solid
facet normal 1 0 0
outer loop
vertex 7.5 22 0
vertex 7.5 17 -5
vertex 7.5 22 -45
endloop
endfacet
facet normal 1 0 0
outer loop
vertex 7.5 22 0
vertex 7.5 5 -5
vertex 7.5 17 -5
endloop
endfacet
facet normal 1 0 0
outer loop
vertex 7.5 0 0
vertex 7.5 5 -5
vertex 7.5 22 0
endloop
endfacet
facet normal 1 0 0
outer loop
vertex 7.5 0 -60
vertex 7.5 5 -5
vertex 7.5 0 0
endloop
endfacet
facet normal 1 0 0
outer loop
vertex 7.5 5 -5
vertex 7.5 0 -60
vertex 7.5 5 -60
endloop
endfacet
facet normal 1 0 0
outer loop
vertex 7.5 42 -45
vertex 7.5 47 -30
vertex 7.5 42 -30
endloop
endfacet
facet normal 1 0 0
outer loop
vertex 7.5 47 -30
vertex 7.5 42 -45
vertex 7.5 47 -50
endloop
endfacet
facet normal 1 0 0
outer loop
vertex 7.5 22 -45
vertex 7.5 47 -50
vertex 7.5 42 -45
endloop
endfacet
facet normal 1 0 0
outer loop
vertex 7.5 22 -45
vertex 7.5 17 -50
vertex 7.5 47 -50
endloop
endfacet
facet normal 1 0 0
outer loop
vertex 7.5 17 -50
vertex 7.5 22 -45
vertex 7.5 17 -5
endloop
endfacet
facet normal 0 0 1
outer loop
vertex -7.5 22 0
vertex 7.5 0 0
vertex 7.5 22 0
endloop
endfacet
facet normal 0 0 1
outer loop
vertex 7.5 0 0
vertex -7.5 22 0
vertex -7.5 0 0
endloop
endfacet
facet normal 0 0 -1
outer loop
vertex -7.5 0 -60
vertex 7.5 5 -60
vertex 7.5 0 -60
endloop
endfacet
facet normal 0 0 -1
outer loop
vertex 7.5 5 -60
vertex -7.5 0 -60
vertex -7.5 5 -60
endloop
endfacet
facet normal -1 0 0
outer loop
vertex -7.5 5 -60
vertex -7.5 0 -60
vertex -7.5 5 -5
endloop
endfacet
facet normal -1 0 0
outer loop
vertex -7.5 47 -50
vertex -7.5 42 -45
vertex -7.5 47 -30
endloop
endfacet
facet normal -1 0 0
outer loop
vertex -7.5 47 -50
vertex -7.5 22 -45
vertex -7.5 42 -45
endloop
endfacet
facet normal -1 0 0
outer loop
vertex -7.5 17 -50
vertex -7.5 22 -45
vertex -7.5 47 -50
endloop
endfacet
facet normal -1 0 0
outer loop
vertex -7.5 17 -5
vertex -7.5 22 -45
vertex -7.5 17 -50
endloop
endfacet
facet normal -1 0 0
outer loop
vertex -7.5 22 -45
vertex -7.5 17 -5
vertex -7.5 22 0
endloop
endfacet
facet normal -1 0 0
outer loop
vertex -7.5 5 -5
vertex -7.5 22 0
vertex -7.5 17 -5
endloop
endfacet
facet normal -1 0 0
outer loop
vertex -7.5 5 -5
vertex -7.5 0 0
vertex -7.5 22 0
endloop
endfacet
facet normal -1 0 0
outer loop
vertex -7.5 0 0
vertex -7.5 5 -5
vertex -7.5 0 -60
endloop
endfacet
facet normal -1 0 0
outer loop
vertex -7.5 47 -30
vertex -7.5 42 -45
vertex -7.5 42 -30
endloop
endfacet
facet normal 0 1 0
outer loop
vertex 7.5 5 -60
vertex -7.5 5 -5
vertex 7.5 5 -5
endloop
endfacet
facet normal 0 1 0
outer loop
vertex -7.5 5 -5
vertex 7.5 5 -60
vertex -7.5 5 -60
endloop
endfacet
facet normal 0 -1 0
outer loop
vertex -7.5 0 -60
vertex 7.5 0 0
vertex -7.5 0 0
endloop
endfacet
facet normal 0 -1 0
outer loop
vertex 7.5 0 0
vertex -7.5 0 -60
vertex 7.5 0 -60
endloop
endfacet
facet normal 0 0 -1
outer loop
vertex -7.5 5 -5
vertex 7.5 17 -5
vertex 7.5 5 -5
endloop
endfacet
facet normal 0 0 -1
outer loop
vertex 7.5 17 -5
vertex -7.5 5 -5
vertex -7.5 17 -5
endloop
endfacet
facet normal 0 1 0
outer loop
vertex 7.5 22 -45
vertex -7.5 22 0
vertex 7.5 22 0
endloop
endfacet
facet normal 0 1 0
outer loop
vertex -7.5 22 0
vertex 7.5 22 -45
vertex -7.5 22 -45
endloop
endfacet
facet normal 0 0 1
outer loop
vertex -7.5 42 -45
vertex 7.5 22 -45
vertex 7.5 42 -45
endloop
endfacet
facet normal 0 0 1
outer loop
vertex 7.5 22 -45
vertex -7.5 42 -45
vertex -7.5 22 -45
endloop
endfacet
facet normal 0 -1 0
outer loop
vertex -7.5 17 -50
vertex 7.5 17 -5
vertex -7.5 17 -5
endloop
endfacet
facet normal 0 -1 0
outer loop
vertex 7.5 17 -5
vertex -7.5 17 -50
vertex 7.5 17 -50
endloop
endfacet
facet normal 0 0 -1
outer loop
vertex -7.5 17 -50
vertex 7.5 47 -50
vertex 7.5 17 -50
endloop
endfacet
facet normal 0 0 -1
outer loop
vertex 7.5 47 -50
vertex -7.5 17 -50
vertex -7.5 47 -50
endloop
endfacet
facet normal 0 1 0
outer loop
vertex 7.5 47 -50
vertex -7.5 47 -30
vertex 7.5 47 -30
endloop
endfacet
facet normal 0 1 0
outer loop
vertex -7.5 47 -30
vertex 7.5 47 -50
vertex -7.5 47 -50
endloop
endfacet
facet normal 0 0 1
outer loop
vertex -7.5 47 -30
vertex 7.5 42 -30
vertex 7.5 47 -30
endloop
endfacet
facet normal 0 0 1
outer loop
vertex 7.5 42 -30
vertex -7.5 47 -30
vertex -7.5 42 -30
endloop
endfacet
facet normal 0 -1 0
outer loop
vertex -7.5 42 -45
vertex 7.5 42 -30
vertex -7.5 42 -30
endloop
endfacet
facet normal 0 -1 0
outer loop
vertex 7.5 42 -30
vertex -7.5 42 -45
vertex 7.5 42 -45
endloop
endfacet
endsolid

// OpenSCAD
//------------------------------------------------------------
//  SHOWER-DOOR HANGER  –  five-segment parametric bracket
//  gap is preserved when corner_radius > 0
//------------------------------------------------------------
module shower_hanger(
    /* ─── Core dimensions (mm) ──────────────────────────── */
    width            = 15,
    bar_thickness    = 5,
    outside_drop     = 60,
    door_thickness   = 10,   // glass / frame thickness
    clearance        = 2,    // extra wiggle room
    inside_drop      = 40,
    hook_depth       = 25,
    lip_height       = 20,
    /* ─── Optional nicety ───────────────────────────────── */
    corner_radius    = 0     // 0 = square; >0 = fillet radius
){
    //— keep the requested opening after filleting ————————
    gap_nominal = door_thickness + clearance;
    gap         = gap_nominal + (corner_radius > 0 ? 2*corner_radius : 0);

    //— derived Y-positions ——————————————————————————
    top_length  = gap + 2*bar_thickness;  // bar-to-bar span
    y_outside   = 0;
    y_inside    = bar_thickness + gap;    // where inside drop starts
    y_hook_base = y_inside;
    y_hook_end  = y_hook_base + hook_depth + bar_thickness;

    //— tiny helper cube —————————————————————————
    module bar(size_vec, pos_vec=[0,0,0])
        translate(pos_vec) cube(size_vec, center=false);

    //— raw geometry (five overlapping bars) ————————
    module raw_bracket() {
        union() {
            // 1 ↓ outside vertical
            bar([width, bar_thickness, outside_drop],
                [-width/2, y_outside, -outside_drop]);

            // 2 → top over the door
            bar([width, top_length, bar_thickness],
                [-width/2, y_outside, -bar_thickness]);

            // 3 ↓ inside vertical
            bar([width, bar_thickness, inside_drop],
                [-width/2,
                 y_inside,
                 -bar_thickness - inside_drop]);

            // 4 → hook
            bar([width, hook_depth + bar_thickness, bar_thickness],
                [-width/2,
                 y_hook_base,
                 -bar_thickness - inside_drop - bar_thickness]);

            // 5 ↑ lip
            bar([width, bar_thickness, lip_height],
                [-width/2,
                 y_hook_end - bar_thickness,
                 -bar_thickness - inside_drop - bar_thickness]);
        }
    }

    //— square or filleted version ————————————————
    if (corner_radius > 0)
        minkowski() {
            raw_bracket();
            cylinder(h = 1, r = corner_radius, $fn = 32);
        }
    else
        raw_bracket();
}

// preview with defaults
shower_hanger();
